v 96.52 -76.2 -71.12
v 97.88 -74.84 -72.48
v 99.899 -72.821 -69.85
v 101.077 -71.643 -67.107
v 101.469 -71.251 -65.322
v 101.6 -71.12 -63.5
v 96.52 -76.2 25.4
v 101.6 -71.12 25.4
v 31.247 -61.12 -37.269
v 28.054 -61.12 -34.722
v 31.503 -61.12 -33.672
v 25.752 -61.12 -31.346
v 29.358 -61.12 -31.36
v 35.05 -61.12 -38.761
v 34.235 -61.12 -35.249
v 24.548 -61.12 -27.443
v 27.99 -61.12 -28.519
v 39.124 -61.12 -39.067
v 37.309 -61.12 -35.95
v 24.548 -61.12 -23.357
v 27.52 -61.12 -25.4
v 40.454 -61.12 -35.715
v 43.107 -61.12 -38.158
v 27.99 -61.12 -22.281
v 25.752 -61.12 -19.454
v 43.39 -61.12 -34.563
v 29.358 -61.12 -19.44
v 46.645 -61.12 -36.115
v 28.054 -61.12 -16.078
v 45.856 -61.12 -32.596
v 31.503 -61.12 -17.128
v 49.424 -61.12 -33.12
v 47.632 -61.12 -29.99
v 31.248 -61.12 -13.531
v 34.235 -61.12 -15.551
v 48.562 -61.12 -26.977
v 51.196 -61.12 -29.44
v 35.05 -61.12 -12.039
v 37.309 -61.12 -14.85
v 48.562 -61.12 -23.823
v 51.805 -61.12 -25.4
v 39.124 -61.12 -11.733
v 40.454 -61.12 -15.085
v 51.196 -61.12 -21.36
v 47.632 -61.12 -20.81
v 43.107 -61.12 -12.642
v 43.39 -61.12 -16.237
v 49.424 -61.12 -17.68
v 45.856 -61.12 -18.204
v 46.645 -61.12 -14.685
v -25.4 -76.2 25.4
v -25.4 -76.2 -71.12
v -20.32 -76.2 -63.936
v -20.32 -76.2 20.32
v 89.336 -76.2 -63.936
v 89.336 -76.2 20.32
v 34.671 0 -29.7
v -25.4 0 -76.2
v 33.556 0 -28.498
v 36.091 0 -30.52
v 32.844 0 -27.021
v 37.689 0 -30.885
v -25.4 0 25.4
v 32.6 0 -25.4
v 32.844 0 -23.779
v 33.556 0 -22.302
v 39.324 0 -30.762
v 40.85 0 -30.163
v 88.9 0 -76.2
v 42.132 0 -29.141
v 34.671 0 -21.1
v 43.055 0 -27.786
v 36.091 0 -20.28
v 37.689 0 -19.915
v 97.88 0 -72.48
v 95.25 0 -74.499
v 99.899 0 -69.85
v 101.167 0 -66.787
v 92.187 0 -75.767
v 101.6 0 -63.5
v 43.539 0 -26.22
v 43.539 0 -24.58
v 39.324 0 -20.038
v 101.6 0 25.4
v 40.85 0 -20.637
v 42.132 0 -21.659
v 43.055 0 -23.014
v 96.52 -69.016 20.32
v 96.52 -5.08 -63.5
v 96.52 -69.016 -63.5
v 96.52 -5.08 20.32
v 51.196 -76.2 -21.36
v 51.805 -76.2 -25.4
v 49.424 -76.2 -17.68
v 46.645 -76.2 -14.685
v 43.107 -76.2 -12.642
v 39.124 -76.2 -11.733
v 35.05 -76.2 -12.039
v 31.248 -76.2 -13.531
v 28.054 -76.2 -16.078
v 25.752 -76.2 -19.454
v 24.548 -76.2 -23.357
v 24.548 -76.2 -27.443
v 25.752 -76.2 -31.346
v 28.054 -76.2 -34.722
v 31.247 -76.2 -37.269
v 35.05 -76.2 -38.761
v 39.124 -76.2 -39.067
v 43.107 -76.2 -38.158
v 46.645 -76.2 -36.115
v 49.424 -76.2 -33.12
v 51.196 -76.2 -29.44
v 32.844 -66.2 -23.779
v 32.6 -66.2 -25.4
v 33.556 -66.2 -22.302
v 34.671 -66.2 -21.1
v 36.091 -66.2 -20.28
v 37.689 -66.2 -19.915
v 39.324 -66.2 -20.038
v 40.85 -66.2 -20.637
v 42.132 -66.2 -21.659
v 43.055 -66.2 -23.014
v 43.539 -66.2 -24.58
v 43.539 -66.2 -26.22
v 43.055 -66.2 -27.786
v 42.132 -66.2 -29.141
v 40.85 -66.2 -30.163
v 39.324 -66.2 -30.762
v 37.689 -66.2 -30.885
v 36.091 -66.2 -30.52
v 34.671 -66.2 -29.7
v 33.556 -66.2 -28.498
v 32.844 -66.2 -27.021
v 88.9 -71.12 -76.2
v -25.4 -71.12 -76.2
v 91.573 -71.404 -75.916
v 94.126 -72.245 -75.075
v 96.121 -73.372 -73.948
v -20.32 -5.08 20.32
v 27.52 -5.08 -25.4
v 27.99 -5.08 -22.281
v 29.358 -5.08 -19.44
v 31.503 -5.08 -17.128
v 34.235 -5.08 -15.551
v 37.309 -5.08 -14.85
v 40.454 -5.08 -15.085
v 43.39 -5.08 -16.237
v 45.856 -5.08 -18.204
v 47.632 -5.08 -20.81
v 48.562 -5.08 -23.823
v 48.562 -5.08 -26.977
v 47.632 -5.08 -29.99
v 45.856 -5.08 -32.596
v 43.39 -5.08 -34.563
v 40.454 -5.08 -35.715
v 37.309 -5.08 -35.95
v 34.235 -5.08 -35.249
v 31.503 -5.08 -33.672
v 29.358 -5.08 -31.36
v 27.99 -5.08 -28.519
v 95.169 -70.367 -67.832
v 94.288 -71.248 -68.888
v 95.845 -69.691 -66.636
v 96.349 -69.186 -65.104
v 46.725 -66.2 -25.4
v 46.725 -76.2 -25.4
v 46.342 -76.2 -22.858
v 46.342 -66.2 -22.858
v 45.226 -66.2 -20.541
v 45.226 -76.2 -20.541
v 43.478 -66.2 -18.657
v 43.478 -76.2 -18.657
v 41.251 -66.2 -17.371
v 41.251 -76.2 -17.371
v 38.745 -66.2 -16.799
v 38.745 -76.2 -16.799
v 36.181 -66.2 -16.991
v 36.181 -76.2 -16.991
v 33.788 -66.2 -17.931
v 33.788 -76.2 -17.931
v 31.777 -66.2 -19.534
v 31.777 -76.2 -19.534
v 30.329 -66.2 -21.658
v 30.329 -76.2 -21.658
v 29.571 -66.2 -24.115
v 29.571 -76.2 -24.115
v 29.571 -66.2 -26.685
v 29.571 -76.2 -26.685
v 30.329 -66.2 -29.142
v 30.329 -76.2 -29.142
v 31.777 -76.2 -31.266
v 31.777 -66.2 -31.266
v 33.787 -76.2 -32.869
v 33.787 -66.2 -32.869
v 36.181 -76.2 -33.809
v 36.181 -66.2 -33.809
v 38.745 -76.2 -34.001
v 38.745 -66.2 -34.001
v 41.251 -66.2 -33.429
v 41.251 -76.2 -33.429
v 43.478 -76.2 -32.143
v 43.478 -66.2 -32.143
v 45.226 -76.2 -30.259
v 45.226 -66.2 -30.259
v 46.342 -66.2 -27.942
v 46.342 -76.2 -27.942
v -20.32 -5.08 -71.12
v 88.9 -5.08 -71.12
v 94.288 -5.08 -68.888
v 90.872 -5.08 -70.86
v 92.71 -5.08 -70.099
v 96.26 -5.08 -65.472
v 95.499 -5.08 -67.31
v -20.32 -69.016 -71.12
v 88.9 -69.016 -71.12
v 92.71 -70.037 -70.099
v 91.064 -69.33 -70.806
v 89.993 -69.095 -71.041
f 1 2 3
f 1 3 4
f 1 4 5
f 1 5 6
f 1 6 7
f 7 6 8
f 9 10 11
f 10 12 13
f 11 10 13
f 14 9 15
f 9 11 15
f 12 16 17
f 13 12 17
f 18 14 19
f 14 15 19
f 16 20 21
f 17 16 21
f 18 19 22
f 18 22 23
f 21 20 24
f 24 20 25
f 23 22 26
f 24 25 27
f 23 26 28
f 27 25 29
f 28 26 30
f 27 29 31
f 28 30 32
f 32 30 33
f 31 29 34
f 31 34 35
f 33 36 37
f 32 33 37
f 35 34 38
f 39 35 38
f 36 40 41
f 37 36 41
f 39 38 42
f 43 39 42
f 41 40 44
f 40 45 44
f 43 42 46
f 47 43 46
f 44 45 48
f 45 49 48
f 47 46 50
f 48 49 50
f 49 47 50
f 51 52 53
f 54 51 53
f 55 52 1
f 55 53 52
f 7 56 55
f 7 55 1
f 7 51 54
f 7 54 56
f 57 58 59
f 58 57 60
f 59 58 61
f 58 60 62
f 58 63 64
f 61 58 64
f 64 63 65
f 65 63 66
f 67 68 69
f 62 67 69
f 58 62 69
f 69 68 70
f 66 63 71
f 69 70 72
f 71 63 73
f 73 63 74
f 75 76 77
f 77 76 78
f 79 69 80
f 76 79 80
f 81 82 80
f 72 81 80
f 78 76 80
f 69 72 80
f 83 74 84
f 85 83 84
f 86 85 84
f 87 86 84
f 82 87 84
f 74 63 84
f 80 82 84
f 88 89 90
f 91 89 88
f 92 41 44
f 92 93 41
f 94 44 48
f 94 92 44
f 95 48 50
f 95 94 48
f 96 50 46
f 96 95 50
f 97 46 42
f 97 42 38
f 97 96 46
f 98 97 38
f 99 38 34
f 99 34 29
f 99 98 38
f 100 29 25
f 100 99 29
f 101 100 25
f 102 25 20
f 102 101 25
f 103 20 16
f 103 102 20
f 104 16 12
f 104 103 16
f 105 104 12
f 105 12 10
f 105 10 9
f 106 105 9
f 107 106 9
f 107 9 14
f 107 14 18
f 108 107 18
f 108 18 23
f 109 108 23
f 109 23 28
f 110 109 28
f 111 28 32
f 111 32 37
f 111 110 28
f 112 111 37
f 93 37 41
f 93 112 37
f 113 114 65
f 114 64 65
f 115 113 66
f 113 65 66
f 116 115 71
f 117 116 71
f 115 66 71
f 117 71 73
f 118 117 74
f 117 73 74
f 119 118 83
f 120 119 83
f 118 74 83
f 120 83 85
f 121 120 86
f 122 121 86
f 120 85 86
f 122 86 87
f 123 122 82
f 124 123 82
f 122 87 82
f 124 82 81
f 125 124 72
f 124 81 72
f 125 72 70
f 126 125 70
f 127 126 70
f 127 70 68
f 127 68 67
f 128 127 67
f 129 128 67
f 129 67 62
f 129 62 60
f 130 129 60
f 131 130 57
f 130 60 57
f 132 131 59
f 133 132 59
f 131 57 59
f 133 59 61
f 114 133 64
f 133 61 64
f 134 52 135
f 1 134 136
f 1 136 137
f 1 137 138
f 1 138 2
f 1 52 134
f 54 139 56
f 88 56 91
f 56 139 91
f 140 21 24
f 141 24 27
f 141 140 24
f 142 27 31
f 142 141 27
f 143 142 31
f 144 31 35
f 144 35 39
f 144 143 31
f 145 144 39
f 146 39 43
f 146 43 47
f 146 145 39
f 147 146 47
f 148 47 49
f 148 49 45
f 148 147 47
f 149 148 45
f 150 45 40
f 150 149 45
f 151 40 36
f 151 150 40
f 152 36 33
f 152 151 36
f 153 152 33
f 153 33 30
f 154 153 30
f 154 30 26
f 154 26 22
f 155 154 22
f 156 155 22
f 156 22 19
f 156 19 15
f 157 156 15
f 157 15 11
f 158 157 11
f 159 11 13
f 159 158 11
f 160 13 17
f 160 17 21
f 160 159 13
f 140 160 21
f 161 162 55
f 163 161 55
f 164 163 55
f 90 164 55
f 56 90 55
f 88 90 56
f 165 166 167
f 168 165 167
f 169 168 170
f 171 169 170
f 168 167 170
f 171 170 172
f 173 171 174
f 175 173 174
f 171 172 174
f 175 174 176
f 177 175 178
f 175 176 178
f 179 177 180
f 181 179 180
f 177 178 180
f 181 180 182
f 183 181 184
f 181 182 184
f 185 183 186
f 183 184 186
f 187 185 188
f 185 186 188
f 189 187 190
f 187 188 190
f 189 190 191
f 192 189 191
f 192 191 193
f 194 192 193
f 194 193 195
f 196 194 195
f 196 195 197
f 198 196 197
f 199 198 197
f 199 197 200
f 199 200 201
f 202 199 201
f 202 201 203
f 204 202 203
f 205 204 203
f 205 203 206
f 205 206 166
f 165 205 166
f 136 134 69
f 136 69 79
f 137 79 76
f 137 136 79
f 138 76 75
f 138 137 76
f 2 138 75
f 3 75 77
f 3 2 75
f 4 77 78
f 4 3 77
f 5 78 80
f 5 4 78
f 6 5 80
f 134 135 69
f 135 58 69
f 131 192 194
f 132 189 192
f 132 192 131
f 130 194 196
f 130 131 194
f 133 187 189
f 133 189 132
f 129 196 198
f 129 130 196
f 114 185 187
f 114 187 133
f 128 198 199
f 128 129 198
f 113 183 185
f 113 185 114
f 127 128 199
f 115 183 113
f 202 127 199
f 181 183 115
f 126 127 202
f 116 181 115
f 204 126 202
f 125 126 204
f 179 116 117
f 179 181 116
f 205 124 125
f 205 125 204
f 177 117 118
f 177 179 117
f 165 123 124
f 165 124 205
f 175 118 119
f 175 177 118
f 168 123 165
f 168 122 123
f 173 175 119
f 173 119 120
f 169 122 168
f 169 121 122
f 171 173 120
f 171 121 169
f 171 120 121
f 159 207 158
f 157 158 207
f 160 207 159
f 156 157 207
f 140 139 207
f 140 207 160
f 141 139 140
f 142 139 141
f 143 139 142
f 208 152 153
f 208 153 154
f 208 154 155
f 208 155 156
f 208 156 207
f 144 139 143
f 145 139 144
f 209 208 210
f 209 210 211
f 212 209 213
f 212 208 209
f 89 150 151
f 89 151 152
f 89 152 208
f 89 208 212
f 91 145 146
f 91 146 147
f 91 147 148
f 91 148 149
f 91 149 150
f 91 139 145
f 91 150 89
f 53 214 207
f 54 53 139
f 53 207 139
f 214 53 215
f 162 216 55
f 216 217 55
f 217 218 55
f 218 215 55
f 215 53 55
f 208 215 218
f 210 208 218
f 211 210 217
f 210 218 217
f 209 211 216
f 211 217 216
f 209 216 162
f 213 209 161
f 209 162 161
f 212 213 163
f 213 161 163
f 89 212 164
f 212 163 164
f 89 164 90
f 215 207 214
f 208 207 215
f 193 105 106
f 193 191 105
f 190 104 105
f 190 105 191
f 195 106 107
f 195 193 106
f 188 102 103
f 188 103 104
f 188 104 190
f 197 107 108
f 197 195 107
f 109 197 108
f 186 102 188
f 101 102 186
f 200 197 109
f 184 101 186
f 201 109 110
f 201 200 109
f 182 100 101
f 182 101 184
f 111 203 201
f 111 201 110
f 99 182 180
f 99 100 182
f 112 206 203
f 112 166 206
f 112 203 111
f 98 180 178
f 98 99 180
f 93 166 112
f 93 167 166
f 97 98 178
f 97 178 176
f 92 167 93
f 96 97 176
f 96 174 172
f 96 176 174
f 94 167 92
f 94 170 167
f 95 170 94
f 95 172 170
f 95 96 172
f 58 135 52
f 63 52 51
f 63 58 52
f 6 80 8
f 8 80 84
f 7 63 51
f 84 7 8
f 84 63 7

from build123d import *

# Parameters (mm, degrees)
F0_W           = 127
F0_H           = 101.6
F1_DEPTH       = 76.2
F3_D           = 11
F3_CBORE_D     = 17.25
F3_CBORE_DEPTH = 10
F4_SIZE        = 5.08
F5_R           = 12.7
F6_T           = -5.08


with BuildPart() as f1:
    # F0 (on Front) → F1 (new body)
    with BuildSketch(Plane.XZ):
        with Locations((38.1, -25.4)):
            Rectangle(F0_W, F0_H)
    extrude(amount=F1_DEPTH)

    # F3 (through all)
    with Locations(Plane.XZ.offset(76.2)):
        with Locations((38.1, -25.4)):
            CounterBoreHole(F3_D / 2, F3_CBORE_D / 2, F3_CBORE_DEPTH)

    # F4
    f4_edges = [f1.edges().sort_by_distance(p)[0] for p in [
        (38.1, -76.2, -76.2),
        (101.6, -76.2, -25.4),
    ]]
    chamfer(f4_edges, length=F4_SIZE)

    # F5
    f5_edges = [f1.edges().sort_by_distance(p)[0] for p in [
        (101.6, -35.56, -76.2),
    ]]
    fillet(f5_edges, radius=F5_R)

    # F6
    f6_openings = [f1.faces().sort_by_distance(p)[0] for p in [
        (35.56, -76.2, 23.844989),
    ]]
    offset(amount=F6_T, openings=f6_openings, kind=Kind.INTERSECTION)


solid = f1.part
